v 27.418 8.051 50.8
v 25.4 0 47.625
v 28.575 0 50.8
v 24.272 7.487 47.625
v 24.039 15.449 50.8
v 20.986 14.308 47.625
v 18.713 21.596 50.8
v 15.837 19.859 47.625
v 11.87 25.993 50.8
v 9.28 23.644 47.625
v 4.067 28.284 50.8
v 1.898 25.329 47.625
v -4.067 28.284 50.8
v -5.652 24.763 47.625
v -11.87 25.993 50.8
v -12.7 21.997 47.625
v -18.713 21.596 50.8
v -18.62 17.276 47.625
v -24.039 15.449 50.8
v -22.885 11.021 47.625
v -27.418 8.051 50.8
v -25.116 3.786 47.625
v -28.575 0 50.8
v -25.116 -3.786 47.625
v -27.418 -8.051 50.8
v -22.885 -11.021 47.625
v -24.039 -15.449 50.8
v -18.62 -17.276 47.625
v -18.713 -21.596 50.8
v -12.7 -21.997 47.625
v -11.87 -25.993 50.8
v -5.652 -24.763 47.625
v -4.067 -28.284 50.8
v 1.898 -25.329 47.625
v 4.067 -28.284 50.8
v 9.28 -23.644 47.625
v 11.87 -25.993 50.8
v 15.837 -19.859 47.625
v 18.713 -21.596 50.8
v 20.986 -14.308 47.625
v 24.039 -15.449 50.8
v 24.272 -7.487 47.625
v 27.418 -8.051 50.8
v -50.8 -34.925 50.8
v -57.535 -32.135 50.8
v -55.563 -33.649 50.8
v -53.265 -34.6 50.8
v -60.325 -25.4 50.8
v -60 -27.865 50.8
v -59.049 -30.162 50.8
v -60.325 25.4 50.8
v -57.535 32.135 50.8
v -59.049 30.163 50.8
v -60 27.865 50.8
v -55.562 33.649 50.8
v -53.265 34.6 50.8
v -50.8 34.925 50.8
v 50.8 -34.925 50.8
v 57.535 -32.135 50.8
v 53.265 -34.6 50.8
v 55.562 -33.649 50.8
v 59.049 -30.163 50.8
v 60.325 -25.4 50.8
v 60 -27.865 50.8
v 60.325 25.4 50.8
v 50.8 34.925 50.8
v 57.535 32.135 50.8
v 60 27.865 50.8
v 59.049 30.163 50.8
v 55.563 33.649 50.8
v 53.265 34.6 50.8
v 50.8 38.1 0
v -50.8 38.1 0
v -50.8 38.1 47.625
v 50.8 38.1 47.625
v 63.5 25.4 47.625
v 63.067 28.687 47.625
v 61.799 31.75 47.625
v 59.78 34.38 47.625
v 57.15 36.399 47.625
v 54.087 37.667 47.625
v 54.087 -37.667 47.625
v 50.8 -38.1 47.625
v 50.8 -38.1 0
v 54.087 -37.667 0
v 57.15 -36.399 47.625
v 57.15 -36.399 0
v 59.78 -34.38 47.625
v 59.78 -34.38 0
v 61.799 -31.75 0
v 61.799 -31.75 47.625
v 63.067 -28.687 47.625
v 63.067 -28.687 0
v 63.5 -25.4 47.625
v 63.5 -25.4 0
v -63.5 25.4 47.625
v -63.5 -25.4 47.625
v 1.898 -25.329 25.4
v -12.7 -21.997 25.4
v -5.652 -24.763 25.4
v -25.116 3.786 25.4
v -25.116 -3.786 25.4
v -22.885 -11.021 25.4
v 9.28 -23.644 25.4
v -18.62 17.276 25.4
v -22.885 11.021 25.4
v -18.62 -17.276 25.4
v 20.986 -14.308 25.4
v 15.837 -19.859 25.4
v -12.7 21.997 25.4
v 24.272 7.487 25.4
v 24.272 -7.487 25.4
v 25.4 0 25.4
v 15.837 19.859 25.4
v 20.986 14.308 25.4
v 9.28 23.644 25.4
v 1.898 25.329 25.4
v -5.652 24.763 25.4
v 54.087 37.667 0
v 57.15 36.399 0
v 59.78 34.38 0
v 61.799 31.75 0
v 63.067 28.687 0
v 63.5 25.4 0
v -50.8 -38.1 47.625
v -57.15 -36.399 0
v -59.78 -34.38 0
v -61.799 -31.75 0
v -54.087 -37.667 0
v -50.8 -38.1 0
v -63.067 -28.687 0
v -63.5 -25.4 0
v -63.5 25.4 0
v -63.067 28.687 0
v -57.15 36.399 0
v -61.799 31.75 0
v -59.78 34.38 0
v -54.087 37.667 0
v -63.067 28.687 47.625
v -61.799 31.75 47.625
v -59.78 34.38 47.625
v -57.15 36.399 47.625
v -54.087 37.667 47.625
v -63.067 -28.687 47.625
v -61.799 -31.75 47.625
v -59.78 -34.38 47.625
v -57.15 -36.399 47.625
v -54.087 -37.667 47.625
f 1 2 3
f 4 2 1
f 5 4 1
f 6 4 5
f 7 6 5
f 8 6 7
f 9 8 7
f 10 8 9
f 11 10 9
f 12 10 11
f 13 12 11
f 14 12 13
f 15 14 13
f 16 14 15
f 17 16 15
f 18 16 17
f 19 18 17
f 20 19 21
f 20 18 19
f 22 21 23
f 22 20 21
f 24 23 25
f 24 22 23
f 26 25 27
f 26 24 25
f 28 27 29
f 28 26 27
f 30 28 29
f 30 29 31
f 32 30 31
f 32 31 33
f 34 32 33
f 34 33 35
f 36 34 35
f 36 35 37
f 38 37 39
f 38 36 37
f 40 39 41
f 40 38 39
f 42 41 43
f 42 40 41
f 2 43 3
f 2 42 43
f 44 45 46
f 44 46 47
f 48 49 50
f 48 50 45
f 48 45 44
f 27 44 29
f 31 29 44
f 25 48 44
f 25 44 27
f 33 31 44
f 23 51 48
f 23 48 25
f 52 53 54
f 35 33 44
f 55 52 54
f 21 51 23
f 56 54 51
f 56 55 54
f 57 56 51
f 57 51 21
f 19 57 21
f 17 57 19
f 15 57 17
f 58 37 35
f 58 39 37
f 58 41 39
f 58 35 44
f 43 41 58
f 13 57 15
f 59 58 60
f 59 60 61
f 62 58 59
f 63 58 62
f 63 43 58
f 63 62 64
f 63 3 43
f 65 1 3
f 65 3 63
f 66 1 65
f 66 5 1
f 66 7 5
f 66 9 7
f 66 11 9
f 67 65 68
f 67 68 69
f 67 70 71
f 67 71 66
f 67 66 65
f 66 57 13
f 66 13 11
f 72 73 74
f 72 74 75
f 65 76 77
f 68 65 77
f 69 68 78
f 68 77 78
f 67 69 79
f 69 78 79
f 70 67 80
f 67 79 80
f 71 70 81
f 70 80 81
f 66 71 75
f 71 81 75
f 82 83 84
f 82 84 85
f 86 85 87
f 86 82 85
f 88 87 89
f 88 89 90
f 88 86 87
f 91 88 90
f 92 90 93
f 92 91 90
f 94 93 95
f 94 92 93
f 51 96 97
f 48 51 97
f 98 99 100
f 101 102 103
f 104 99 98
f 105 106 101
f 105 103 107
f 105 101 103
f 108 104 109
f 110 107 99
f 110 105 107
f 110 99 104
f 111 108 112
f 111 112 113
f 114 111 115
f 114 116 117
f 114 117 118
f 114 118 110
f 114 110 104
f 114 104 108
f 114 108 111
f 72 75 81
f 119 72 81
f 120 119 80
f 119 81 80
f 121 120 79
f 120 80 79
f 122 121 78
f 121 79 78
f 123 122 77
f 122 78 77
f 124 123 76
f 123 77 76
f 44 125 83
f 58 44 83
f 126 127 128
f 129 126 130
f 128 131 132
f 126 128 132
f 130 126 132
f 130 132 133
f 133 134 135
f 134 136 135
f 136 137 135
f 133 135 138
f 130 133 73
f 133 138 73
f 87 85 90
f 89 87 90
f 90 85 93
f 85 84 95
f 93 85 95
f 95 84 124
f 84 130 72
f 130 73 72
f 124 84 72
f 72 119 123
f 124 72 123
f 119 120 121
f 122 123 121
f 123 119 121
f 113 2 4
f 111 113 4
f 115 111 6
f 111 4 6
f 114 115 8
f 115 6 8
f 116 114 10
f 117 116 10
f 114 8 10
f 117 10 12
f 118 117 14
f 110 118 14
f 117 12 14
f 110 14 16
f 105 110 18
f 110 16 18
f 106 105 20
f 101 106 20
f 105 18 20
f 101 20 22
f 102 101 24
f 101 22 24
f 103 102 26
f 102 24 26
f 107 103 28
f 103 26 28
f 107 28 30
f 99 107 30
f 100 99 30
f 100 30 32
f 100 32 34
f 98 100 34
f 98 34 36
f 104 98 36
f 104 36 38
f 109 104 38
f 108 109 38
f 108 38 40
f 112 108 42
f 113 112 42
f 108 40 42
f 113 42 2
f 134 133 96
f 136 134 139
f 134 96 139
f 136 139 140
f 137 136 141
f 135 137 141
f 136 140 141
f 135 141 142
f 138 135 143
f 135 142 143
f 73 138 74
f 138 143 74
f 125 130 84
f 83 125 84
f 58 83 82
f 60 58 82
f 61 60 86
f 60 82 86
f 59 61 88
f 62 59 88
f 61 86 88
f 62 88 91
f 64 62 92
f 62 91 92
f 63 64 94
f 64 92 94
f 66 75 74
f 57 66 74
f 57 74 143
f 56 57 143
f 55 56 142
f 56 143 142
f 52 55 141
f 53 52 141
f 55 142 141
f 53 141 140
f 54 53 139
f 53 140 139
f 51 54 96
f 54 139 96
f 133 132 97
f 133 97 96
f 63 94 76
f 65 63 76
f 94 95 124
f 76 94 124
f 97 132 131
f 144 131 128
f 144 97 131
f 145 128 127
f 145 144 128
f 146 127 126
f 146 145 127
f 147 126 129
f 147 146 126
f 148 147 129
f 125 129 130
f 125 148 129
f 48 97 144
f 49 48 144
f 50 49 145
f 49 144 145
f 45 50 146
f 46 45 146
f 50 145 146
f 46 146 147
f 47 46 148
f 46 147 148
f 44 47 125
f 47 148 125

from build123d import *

# Parameters (mm, degrees)
F0_W     = 127
F0_H     = 76.2
F1_DEPTH = 50.8
F2_R     = 25.4
F3_DEPTH = 25.4
F4_R     = 12.7
F5_SIZE  = 3.175


with BuildPart() as f1:
    # F0 (on Top) → F1 (new body)
    with BuildSketch(Plane.XY):
        Rectangle(F0_W, F0_H)
    extrude(amount=F1_DEPTH)

    # F2 (on face) → F3 (cut)
    with BuildSketch(Plane.XY.offset(50.8)):
        Circle(F2_R)
    extrude(amount=-F3_DEPTH, mode=Mode.SUBTRACT)

    # F4
    f4_edges = [f1.edges().sort_by_distance(p)[0] for p in [
        (-63.5, -38.1, 25.4),
        (63.5, -38.1, 25.4),
        (63.5, 38.1, 25.4),
        (-63.5, 38.1, 25.4),
    ]]
    fillet(f4_edges, radius=F4_R)

    # F5
    f5_edges = [f1.edges().sort_by_distance(p)[0] for p in [
        (63.5, 0, 50.8),
        (59.780256, -34.380256, 50.8),
        (59.780256, 34.380256, 50.8),
        (0, -38.1, 50.8),
        (0, 38.1, 50.8),
        (-59.780256, -34.380256, 50.8),
        (-59.780256, 34.380256, 50.8),
        (-63.5, 0, 50.8),
        (-25.4, 0, 50.8),
    ]]
    chamfer(f5_edges, length=F5_SIZE)


solid = f1.part
